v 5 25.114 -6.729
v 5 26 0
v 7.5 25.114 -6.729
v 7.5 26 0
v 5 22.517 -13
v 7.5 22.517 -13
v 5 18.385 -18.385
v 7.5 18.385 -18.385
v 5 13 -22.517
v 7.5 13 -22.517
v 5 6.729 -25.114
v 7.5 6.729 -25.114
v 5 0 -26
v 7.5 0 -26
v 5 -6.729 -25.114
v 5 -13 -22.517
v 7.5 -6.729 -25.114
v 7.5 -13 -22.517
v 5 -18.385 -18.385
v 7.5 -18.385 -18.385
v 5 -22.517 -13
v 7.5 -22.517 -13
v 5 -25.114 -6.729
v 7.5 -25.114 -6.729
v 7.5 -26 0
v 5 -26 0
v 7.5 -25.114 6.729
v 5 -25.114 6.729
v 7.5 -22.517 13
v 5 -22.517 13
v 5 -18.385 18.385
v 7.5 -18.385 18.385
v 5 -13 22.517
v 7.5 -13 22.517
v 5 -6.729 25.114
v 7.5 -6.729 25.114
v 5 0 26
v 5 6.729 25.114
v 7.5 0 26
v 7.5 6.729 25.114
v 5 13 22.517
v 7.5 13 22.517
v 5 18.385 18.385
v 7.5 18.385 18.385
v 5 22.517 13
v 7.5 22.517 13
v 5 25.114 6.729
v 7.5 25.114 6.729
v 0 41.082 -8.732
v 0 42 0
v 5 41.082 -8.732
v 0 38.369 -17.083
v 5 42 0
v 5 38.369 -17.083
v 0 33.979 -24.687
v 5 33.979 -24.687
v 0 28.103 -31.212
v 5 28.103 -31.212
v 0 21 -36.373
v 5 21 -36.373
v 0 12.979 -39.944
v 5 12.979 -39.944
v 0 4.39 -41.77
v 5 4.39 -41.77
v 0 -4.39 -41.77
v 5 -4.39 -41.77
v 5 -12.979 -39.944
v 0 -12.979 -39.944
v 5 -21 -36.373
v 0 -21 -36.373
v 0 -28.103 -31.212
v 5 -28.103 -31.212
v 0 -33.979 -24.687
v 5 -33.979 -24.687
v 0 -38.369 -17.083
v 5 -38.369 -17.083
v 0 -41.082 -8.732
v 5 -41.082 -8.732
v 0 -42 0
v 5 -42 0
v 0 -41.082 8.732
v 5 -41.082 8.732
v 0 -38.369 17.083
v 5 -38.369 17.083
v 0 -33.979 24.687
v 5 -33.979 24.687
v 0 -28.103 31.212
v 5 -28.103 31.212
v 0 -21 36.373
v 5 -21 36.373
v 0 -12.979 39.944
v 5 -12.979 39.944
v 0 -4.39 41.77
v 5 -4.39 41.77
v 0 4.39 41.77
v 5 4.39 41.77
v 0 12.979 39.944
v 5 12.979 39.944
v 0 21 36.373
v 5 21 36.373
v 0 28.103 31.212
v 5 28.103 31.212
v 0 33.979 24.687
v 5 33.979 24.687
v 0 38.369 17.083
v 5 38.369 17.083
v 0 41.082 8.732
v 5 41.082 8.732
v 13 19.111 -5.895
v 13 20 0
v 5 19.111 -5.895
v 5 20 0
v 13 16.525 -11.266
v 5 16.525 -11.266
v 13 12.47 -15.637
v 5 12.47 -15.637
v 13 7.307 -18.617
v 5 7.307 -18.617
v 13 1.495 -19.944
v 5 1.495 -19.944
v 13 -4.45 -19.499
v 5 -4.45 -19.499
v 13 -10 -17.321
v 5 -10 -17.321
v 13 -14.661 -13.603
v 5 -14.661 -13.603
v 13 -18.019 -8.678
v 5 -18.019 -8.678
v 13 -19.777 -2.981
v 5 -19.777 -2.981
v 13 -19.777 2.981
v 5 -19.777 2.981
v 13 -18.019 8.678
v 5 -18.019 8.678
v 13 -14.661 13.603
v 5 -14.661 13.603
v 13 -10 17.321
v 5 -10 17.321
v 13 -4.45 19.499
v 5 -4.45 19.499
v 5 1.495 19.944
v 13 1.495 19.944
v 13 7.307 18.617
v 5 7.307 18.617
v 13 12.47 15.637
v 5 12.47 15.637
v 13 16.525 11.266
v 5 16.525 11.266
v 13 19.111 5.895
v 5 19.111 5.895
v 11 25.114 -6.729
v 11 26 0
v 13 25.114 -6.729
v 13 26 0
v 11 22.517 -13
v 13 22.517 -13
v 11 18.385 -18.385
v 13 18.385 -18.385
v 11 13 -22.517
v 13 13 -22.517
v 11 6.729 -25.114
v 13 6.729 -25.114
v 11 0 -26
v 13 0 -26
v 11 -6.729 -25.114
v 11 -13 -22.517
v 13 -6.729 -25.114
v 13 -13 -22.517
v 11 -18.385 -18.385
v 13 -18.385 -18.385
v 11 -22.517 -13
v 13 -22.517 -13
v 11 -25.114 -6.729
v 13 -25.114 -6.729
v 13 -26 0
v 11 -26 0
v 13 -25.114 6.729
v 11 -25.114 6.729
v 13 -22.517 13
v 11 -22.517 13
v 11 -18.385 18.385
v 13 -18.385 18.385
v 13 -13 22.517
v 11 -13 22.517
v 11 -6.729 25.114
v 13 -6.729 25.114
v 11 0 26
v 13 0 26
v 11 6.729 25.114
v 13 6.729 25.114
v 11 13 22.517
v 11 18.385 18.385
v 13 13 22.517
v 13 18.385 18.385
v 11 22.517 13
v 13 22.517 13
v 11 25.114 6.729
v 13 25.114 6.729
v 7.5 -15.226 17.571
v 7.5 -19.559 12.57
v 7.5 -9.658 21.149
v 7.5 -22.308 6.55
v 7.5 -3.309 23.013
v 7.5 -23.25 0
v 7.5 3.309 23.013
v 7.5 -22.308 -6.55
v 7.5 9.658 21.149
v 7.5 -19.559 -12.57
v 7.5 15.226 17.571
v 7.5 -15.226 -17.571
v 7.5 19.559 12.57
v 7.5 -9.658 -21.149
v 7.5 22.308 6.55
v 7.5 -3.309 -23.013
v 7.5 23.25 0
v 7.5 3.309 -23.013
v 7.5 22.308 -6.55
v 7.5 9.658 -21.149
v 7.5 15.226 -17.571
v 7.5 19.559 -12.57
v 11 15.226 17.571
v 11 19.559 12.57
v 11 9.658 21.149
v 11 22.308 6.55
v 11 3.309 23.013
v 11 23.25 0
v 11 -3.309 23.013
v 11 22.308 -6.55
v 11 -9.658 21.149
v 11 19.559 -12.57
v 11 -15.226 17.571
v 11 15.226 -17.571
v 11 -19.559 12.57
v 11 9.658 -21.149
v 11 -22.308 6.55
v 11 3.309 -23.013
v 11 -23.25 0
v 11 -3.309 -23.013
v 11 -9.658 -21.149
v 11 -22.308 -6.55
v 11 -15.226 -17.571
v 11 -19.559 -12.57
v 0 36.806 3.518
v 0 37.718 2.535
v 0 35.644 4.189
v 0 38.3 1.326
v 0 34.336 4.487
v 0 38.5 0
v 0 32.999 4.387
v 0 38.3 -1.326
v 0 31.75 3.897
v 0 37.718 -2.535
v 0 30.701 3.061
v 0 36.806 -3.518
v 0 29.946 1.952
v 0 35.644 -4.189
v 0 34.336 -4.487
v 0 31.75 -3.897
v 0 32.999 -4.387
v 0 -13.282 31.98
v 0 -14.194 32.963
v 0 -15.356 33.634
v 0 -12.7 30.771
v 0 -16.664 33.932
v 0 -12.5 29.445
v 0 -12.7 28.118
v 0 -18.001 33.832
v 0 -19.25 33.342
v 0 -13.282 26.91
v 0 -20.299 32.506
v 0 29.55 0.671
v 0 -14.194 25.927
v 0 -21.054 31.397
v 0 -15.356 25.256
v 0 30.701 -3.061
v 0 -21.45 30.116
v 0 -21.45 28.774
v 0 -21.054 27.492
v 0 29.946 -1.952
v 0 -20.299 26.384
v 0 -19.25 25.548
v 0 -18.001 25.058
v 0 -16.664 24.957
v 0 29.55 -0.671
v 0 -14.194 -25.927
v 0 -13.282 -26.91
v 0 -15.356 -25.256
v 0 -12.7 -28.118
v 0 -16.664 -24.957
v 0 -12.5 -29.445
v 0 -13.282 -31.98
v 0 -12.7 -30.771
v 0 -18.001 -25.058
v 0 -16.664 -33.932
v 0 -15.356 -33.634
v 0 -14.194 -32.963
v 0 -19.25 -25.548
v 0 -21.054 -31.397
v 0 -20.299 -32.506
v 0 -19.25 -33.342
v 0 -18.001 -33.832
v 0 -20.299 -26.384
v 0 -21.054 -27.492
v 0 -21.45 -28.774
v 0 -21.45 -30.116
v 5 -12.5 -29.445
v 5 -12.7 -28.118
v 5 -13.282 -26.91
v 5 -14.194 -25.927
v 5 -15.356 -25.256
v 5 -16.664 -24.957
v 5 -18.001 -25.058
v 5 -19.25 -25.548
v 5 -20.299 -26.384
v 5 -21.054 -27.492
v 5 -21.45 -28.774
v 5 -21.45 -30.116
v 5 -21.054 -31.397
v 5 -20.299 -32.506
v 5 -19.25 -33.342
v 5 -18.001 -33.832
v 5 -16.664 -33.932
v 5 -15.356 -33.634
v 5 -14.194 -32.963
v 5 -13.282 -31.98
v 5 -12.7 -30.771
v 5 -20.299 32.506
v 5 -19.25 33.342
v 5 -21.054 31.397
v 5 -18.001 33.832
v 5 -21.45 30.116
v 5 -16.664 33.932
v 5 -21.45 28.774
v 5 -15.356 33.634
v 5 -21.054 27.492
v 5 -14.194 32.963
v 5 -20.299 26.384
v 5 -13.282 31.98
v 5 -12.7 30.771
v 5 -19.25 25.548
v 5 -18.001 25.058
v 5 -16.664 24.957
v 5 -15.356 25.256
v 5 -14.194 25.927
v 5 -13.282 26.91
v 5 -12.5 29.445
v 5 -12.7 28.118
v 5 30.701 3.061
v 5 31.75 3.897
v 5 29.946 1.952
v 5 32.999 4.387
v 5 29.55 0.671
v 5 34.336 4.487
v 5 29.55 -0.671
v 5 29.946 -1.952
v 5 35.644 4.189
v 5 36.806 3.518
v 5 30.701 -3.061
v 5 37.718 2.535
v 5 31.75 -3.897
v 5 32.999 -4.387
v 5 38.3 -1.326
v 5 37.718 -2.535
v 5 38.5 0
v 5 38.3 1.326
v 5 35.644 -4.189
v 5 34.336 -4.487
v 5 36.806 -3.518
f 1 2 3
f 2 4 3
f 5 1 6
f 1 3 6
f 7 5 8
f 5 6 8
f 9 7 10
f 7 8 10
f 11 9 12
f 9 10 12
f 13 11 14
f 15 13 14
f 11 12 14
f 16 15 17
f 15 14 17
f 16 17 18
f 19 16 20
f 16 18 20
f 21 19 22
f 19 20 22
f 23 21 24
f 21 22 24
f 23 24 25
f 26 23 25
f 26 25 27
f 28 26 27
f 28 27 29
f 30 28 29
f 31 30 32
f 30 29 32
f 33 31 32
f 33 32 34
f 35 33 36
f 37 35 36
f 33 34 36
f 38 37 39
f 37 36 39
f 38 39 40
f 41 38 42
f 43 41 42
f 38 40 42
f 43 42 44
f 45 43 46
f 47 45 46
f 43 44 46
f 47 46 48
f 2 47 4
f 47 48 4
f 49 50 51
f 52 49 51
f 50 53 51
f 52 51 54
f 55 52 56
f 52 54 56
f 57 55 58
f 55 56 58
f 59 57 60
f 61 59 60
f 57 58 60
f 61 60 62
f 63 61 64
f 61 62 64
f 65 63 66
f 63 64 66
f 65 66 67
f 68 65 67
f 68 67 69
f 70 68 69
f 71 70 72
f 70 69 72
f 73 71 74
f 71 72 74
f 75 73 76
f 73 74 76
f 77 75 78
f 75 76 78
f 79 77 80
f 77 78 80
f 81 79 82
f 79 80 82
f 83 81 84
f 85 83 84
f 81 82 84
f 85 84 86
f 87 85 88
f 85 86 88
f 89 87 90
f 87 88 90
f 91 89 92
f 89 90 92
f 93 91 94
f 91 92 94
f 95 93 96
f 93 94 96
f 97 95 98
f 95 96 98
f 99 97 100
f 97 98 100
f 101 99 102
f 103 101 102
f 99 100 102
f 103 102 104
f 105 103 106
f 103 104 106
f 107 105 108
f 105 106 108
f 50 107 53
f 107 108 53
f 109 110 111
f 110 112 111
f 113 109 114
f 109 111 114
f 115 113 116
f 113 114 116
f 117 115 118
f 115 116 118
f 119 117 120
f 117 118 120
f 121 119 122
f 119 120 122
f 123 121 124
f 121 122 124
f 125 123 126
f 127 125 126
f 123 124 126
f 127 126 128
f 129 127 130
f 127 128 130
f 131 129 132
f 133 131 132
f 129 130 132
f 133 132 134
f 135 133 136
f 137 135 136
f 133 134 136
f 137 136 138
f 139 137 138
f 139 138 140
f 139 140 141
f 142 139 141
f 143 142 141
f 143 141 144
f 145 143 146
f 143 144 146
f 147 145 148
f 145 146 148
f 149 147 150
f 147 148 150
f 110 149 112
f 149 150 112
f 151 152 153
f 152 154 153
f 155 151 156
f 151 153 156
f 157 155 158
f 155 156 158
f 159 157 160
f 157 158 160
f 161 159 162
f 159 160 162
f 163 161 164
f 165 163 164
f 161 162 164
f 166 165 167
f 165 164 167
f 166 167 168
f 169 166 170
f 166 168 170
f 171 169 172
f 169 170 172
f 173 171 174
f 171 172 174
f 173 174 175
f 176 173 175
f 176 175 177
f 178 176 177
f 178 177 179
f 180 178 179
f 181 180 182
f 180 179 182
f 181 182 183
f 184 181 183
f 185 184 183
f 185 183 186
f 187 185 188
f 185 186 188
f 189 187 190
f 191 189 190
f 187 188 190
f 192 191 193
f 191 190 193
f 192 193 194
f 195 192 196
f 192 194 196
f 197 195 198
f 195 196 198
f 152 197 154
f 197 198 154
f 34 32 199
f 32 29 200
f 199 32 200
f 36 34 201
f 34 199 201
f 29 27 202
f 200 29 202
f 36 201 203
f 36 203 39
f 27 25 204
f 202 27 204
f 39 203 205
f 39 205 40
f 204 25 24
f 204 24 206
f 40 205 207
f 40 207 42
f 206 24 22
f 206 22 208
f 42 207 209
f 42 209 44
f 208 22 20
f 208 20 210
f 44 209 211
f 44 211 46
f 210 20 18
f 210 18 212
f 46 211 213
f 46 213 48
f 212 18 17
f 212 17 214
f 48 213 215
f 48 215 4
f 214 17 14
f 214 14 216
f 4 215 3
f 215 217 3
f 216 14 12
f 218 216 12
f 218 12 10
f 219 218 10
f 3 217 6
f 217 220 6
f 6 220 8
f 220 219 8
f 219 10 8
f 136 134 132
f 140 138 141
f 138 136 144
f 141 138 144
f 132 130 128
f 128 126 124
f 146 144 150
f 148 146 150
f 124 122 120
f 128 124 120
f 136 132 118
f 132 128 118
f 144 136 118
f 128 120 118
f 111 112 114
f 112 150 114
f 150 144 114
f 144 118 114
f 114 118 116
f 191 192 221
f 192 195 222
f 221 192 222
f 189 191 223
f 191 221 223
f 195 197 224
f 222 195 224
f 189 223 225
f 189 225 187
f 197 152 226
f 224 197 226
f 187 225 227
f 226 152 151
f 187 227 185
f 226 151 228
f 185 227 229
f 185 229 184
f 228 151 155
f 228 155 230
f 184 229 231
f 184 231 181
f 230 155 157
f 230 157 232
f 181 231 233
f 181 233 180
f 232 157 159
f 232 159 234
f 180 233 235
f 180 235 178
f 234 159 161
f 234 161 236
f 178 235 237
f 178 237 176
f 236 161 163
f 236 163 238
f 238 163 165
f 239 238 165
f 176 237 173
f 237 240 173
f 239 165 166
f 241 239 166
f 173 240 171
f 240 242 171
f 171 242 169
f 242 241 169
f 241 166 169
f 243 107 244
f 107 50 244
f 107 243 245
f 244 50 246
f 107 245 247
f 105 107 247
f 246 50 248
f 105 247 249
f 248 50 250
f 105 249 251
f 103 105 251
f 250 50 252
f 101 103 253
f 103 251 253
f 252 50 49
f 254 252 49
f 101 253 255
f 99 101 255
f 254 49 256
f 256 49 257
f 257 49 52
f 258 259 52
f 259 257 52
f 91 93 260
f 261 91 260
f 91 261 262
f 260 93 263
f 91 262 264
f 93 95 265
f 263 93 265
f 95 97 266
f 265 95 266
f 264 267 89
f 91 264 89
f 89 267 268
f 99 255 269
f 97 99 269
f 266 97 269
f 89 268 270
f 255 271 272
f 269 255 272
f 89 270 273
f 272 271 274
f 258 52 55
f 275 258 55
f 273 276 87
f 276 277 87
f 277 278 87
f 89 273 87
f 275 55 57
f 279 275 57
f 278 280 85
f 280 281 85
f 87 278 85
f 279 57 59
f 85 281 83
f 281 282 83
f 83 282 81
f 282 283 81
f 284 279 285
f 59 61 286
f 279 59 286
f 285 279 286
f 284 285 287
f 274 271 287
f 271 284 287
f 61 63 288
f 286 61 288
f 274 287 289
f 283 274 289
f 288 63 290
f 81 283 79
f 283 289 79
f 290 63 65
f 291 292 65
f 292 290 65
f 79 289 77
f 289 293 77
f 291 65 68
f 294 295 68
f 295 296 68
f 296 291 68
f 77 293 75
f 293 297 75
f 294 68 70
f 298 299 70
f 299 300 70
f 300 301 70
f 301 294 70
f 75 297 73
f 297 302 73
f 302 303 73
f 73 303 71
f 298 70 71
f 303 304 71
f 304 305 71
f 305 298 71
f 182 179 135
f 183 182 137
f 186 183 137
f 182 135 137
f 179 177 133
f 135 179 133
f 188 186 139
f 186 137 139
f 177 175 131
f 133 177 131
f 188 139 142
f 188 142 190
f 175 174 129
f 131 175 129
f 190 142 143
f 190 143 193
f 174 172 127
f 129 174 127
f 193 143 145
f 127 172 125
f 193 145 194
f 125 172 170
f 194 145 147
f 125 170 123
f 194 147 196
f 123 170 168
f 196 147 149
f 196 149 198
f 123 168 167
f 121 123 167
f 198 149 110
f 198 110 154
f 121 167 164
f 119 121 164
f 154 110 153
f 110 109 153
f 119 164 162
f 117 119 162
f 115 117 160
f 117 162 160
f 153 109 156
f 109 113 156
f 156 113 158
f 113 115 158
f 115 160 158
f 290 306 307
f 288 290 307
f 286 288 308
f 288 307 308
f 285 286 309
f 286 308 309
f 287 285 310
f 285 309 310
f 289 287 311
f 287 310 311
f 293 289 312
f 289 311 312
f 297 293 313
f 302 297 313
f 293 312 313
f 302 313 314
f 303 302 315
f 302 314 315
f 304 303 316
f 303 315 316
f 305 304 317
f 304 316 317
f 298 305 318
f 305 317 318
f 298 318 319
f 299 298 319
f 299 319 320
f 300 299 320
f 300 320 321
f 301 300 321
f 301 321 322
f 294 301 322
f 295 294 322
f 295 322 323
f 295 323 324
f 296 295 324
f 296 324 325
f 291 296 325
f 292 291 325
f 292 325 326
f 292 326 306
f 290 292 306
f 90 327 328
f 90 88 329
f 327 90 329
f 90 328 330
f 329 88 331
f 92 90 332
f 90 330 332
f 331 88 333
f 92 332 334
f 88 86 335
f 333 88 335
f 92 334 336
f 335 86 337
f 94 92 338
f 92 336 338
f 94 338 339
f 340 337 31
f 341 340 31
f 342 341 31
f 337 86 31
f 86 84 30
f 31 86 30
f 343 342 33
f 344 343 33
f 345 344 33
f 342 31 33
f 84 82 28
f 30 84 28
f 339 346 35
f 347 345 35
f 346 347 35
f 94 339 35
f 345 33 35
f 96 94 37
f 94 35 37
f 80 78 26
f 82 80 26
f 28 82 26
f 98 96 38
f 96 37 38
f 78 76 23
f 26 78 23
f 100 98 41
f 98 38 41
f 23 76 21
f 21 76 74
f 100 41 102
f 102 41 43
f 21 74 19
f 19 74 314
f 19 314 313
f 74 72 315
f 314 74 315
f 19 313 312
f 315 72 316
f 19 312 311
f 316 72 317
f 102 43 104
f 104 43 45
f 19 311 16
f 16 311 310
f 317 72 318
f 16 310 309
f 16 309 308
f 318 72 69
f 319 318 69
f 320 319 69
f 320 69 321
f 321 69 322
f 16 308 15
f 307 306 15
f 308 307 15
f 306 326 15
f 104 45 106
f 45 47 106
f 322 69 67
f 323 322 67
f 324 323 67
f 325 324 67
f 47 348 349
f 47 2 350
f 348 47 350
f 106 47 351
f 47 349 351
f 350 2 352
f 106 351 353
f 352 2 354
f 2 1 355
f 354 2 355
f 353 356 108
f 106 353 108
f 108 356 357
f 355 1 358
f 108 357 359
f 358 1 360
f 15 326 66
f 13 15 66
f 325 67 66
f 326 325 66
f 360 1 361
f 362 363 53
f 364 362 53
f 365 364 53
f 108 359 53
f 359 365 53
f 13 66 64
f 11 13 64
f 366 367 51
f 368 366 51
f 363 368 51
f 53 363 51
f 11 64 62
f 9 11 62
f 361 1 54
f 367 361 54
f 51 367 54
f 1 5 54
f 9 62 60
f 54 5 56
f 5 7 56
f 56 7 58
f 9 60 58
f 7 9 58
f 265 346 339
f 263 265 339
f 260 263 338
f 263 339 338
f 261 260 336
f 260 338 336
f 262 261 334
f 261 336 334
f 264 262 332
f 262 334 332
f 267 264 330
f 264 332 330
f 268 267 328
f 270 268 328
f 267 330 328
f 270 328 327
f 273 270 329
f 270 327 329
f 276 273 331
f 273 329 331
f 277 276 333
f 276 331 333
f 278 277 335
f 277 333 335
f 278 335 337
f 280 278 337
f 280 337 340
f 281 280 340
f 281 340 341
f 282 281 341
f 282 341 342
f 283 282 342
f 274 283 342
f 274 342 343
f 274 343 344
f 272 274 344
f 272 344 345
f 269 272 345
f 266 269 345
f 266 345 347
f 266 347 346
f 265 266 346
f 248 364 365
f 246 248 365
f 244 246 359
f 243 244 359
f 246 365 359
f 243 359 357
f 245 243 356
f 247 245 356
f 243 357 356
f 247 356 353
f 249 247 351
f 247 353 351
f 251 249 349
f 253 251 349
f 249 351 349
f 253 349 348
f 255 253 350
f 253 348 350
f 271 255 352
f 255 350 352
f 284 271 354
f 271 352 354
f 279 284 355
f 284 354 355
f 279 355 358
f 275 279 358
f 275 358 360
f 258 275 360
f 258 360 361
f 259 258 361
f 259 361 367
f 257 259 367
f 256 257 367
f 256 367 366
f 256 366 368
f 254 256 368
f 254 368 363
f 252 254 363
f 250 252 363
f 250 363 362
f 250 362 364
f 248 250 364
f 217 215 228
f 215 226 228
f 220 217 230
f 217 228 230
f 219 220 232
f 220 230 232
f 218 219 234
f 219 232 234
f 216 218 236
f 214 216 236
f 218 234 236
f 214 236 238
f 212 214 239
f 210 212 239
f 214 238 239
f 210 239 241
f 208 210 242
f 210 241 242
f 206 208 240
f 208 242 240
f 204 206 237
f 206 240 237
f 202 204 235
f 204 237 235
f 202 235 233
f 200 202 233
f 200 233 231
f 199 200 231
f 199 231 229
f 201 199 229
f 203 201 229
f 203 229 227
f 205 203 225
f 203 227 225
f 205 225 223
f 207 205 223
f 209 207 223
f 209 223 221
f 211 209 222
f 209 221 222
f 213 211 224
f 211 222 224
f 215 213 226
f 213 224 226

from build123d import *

# Parameters (mm, degrees)
SCHIZZO2_R               = 4.5
TAGLIO_ESTRUSIONE1_DEPTH = 60.933296255


with BuildPart() as part:
    # Schizzo1 → Rivoluzione1 (revolve)
    with BuildSketch(Plane.XY):
        Polygon((0, 0), (0, 42), (5, 42), (5, 26), (7.5, 26), (7.5, 23.25), (11, 23.25), (11, 26), (13, 26), (13, 20), (5, 20), (5, 0), align=None)
    revolve(axis=Axis((5, 0, 0), (-1, 0, 0)))

    # Schizzo2 → Taglio-Estrusione1 (cut, through all)
    with BuildSketch(Plane(origin=(5, 0, 0), x_dir=(0, 0, -1), z_dir=(1, 0, 0))):
        with Locations(Location((0, 34, 0), (0, 0, 90))):
            Circle(SCHIZZO2_R)
        with Locations(Location((29.444863729, -17, 0), (0, 0, 90))):
            Circle(SCHIZZO2_R)
        with Locations(Location((-29.444863729, -17, 0), (0, 0, 90))):
            Circle(SCHIZZO2_R)
    extrude(amount=-TAGLIO_ESTRUSIONE1_DEPTH, mode=Mode.SUBTRACT)


solid = part.part
